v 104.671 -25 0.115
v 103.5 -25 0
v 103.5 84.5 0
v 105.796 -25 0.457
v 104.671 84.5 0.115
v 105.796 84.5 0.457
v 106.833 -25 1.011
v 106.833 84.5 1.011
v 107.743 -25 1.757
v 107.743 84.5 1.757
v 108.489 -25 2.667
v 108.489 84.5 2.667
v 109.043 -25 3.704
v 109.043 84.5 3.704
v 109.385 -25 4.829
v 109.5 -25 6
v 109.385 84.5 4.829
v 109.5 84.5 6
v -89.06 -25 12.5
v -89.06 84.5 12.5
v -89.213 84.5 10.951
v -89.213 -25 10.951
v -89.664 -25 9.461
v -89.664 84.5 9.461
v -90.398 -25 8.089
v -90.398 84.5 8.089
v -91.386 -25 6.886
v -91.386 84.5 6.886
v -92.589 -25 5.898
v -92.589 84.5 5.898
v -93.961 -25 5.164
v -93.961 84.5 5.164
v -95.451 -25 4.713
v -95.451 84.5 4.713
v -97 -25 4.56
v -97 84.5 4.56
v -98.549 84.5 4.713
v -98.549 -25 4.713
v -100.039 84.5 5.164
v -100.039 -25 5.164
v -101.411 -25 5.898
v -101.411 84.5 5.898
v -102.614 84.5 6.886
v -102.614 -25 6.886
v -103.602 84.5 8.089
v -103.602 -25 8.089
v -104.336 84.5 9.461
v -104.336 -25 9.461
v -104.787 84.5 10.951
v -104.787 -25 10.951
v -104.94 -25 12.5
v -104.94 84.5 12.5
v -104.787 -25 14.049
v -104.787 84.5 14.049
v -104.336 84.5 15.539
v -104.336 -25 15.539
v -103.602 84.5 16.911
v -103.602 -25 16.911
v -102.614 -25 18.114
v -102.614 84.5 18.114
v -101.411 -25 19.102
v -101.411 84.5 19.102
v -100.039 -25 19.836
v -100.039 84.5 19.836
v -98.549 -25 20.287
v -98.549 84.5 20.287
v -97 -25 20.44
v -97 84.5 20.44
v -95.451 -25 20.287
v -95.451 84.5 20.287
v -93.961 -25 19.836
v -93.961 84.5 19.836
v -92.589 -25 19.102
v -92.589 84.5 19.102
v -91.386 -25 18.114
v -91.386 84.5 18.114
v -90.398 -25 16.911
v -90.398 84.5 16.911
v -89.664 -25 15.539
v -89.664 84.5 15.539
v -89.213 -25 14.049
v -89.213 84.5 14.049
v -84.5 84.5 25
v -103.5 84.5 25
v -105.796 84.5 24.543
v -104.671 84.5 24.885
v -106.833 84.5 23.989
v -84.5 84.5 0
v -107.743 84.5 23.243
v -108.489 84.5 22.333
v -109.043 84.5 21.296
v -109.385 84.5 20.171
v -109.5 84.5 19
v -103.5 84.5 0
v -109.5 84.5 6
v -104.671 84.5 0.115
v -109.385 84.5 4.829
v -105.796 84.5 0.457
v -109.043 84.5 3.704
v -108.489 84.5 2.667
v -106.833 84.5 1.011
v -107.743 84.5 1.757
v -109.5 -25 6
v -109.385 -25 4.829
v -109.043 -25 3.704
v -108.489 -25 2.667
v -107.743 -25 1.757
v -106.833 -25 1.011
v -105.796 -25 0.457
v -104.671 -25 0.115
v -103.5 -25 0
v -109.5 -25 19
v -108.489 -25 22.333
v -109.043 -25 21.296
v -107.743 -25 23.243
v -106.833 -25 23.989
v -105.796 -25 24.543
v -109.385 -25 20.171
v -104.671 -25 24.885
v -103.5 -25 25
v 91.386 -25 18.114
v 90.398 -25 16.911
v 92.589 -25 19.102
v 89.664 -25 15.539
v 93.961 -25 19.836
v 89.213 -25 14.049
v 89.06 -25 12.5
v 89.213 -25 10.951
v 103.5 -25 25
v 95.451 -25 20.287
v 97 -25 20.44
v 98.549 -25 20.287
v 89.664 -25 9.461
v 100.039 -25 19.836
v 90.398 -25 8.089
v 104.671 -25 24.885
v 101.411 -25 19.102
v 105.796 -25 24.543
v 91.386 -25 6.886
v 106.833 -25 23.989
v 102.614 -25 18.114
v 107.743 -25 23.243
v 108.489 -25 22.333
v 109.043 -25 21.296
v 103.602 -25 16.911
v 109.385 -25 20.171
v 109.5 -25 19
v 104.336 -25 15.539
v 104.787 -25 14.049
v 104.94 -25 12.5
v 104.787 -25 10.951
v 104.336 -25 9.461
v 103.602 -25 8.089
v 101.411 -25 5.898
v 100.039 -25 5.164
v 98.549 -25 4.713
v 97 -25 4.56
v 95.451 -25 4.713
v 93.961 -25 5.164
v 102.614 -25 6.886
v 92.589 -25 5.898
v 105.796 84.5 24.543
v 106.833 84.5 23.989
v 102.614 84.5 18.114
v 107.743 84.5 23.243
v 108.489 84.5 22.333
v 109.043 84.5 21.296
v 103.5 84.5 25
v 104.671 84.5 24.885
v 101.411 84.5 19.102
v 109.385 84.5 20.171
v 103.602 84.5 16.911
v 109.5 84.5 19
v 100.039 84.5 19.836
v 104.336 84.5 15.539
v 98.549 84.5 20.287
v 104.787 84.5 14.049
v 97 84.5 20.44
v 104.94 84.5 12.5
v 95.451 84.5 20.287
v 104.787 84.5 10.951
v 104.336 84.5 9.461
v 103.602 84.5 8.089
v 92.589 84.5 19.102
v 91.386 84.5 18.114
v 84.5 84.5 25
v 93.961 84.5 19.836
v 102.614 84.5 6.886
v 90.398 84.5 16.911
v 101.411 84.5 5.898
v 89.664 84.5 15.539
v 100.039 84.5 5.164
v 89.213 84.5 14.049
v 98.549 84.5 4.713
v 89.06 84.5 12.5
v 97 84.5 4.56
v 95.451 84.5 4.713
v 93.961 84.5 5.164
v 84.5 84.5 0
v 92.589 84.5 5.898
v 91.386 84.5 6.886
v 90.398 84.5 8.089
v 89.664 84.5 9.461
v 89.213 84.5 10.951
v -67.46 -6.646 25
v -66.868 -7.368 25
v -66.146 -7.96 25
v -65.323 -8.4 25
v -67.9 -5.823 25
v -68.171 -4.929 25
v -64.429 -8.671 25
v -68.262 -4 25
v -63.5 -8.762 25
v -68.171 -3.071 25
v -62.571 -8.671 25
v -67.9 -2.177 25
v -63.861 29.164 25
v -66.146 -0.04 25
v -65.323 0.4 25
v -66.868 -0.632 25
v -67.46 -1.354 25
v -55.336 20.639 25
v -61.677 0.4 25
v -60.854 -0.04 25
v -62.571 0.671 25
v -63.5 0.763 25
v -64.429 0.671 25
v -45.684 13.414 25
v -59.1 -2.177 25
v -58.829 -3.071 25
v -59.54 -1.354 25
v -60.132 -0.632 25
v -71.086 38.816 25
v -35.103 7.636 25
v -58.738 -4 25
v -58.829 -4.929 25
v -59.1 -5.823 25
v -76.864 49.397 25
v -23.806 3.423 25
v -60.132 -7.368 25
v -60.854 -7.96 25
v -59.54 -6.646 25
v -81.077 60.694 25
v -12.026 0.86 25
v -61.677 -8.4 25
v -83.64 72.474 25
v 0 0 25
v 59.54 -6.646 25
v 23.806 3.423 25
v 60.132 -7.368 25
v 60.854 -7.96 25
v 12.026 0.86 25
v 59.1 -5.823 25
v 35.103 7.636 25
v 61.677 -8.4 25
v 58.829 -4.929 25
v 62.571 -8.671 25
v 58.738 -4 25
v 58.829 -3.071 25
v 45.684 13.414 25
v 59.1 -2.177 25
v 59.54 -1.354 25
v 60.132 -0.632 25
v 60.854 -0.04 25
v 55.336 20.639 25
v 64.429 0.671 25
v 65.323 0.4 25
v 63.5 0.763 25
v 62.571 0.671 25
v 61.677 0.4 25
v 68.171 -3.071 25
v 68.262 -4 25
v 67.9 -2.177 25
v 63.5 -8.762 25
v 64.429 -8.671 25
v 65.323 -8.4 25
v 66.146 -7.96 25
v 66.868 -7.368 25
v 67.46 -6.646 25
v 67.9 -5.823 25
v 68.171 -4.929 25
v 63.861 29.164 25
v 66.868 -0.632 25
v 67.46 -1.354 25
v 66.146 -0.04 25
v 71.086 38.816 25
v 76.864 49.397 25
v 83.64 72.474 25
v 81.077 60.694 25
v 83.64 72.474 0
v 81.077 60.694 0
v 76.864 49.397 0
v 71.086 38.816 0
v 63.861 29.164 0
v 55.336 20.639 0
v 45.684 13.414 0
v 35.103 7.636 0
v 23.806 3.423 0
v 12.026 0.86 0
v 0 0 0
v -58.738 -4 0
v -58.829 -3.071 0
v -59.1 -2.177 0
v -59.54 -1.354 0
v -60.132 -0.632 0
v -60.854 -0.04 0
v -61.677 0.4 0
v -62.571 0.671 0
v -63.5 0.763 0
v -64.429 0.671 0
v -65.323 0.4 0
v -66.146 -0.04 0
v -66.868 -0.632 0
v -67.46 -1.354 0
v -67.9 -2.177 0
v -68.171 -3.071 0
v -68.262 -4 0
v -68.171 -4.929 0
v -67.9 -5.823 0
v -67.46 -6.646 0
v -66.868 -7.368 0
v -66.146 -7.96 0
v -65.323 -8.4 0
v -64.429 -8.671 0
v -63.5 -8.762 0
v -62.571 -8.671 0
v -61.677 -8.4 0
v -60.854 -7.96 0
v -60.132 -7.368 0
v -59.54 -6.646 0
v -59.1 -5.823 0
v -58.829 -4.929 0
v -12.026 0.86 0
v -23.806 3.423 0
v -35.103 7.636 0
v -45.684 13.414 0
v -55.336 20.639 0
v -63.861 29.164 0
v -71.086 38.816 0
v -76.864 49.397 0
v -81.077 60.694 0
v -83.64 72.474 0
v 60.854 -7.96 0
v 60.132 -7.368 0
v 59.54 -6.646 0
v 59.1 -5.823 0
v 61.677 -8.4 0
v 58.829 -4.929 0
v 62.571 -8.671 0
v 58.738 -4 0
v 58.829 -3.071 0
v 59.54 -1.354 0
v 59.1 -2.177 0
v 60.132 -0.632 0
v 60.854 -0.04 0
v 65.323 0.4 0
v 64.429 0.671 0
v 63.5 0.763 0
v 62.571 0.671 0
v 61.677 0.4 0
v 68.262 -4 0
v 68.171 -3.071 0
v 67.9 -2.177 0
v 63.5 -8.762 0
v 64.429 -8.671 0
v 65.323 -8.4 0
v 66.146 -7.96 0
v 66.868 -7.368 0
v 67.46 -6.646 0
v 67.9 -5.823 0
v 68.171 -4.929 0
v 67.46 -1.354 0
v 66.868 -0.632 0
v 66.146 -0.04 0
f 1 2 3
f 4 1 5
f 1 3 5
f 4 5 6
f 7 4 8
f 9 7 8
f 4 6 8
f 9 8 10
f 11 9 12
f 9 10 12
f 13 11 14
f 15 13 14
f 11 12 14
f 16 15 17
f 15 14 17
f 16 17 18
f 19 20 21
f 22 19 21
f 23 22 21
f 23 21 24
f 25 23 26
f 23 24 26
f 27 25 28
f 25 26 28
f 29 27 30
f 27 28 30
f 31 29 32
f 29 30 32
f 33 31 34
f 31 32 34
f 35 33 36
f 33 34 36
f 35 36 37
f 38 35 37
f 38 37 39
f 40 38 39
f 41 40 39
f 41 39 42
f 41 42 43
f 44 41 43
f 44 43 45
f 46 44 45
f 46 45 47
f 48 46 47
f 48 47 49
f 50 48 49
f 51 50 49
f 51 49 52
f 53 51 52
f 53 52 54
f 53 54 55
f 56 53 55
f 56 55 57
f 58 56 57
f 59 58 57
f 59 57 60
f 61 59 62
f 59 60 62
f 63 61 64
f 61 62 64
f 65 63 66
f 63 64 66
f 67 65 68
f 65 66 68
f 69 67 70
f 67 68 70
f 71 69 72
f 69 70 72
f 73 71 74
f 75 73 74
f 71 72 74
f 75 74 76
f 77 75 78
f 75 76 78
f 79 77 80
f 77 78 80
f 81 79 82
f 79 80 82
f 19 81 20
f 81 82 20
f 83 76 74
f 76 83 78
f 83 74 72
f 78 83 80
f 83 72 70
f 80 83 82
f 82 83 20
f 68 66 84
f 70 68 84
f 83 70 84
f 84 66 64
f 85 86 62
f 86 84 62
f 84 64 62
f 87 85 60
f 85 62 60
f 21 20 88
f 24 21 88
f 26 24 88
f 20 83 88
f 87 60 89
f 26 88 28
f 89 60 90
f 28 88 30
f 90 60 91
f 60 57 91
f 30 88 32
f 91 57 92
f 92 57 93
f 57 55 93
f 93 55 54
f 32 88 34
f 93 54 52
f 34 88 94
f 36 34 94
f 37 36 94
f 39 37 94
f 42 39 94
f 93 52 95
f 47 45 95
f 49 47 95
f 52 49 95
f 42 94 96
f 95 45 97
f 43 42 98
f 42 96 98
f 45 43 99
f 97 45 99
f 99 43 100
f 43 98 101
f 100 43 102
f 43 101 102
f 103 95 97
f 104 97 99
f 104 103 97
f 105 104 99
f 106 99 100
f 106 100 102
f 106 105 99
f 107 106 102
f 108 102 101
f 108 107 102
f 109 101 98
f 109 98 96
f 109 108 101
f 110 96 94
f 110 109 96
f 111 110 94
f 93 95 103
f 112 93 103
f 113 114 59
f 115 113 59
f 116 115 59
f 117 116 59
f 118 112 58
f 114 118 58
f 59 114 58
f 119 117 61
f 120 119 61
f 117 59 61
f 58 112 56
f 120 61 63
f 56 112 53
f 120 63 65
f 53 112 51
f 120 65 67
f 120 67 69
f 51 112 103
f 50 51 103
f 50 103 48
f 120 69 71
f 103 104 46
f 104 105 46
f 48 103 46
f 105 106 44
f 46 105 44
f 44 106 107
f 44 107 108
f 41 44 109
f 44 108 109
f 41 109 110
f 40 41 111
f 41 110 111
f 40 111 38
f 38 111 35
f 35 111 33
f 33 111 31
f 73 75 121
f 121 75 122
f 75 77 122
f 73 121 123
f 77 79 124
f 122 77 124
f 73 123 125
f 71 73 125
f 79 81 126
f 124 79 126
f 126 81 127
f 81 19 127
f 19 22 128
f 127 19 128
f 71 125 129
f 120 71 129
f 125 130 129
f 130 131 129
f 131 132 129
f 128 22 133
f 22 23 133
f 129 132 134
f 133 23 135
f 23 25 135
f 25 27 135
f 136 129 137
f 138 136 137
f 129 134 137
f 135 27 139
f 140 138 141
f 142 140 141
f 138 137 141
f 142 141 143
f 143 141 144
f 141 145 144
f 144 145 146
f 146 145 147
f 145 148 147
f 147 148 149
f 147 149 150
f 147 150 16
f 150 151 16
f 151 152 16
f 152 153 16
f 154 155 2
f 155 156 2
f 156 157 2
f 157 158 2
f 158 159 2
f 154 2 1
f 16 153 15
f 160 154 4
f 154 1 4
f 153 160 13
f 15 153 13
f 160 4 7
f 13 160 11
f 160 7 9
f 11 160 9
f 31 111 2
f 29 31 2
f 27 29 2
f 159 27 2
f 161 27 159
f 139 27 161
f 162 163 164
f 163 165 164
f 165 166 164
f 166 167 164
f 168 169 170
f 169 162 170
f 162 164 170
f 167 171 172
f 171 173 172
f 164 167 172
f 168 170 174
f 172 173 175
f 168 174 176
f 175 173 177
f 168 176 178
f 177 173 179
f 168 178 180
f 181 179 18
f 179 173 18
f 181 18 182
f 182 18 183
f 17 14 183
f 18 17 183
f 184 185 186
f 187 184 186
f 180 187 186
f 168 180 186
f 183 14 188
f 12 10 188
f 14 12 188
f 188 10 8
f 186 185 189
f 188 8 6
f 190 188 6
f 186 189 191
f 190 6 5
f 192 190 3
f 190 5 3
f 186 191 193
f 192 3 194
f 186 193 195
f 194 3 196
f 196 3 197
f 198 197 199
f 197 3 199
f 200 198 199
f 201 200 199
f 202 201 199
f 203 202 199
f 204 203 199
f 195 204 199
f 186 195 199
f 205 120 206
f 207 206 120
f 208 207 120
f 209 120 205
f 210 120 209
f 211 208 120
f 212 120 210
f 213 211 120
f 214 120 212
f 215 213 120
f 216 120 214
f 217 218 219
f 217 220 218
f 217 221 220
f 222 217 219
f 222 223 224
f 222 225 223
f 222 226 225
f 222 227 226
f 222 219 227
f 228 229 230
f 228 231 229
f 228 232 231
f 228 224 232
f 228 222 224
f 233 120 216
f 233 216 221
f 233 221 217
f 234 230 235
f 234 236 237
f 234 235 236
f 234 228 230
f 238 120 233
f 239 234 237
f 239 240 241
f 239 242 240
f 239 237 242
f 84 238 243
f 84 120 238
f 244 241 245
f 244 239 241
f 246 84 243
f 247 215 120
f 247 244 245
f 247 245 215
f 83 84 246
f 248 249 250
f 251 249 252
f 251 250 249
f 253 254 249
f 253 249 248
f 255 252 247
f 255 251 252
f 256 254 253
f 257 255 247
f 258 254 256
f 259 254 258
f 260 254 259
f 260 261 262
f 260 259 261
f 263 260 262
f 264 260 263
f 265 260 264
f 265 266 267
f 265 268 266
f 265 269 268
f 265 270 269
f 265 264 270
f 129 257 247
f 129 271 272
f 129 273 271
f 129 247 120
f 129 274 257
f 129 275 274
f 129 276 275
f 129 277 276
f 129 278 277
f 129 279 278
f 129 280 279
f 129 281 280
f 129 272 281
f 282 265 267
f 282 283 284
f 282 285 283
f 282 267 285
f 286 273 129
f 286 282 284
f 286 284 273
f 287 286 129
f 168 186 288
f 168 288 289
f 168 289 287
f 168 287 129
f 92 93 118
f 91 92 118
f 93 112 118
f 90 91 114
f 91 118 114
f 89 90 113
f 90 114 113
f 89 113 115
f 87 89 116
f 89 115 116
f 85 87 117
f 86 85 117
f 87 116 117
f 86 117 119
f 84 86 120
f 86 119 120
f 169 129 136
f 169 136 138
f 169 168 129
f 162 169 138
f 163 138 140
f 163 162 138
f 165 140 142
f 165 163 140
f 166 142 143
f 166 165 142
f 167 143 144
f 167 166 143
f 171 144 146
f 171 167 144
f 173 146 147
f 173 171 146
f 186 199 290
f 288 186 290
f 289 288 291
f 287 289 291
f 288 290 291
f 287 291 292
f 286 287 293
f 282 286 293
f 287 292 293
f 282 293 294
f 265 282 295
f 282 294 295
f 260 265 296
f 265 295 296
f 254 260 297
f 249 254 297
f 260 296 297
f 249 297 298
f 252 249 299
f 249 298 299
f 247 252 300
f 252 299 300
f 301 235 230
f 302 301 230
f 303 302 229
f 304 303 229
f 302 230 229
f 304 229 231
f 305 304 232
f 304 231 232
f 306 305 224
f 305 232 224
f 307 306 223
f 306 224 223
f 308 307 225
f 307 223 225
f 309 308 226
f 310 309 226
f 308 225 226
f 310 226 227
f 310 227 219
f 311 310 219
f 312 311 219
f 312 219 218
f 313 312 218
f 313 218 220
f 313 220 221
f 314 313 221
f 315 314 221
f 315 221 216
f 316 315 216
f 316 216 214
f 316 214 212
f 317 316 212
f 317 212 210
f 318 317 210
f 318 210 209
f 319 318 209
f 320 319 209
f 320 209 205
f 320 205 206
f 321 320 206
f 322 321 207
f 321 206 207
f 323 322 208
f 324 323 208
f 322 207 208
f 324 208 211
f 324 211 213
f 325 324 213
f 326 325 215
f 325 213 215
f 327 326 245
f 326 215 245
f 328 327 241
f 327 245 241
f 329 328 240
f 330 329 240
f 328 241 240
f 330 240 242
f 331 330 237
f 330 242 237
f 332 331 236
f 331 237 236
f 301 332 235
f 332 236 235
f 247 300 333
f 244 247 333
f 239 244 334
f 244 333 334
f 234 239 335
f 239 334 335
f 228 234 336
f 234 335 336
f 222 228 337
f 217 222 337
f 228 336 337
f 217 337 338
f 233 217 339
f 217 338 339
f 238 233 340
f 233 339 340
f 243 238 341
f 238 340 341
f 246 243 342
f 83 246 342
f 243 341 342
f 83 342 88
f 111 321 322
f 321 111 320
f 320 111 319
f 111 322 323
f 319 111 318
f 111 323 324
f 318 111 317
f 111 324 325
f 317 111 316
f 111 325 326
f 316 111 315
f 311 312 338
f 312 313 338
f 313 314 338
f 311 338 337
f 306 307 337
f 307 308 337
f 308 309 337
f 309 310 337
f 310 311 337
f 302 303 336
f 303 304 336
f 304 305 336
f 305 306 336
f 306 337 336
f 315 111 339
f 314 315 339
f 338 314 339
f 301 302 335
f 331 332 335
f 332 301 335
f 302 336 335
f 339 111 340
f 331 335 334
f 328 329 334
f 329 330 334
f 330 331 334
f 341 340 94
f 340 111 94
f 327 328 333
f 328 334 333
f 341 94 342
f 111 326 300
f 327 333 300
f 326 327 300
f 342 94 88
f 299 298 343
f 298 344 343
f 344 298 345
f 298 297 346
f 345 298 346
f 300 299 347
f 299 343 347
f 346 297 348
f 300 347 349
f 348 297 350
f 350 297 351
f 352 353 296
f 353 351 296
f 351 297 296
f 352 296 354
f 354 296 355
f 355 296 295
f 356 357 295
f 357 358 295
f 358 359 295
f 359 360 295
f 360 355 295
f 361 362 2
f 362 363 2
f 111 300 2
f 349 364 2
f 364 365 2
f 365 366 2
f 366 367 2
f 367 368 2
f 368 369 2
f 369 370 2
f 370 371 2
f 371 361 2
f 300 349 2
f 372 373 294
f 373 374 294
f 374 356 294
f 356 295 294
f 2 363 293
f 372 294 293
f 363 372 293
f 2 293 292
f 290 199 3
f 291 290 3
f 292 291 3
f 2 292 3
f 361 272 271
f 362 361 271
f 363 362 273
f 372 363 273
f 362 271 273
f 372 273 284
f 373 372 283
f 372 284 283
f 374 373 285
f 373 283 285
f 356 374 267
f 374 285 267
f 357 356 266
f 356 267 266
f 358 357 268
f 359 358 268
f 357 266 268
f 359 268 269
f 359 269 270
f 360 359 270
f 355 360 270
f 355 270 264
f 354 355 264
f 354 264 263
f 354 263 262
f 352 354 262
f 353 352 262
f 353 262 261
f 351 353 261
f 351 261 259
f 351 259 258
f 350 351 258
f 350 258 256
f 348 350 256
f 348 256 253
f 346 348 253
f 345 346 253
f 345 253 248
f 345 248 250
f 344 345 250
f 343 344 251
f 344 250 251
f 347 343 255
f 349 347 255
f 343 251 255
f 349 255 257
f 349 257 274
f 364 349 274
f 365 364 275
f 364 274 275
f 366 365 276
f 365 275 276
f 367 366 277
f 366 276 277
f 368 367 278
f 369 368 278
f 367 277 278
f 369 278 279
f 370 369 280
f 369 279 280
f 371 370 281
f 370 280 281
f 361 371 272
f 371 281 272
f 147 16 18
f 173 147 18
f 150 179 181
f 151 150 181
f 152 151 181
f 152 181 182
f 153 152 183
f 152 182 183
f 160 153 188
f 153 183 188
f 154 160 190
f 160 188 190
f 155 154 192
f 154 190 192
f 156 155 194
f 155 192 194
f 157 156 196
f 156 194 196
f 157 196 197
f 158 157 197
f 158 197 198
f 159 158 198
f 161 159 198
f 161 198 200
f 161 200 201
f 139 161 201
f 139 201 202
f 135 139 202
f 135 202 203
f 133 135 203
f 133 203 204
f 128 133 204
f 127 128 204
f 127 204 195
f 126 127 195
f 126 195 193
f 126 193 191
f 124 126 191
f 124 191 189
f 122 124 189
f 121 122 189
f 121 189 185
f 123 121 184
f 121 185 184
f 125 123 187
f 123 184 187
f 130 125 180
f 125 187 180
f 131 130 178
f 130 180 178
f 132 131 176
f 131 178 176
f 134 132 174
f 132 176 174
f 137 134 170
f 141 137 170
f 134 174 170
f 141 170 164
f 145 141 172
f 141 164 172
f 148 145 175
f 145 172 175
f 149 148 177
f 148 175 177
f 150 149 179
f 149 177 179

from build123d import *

# Parameters (mm, degrees)
BOSS_EXTRUDE1_DEPTH = 25
SKETCH5_R           = 7.94
CUT_EXTRUDE1_DEPTH  = 5000
SKETCH6_R           = 4.7625
CUT_EXTRUDE2_DEPTH  = 5000
FILLET2_R           = 6


with BuildPart() as part:
    # Sketch4 → Boss-Extrude1 (new body)
    with BuildSketch(Plane.XY):
        with BuildLine():
            ThreePointArc((0, -25), (-77.42819254, 7.07180746), (-109.5, 84.5))
            Line((-109.5, 84.5), (-109.5, -25))
            Line((-109.5, -25), (0, -25))
        make_face()
        with BuildLine():
            ThreePointArc((84.5, 84.5), (59.75052301, 24.74947699), (0, 0))
            ThreePointArc((0, 0), (-59.75052301, 24.74947699), (-84.5, 84.5))
            Line((-84.5, 84.5), (-109.5, 84.5))
            ThreePointArc((-109.5, 84.5), (-77.42819254, 7.07180746), (0, -25))
            ThreePointArc((0, -25), (77.42819254, 7.07180746), (109.5, 84.5))
            Line((109.5, 84.5), (84.5, 84.5))
        make_face()
        with BuildLine():
            Line((109.5, -25), (109.5, 84.5))
            ThreePointArc((109.5, 84.5), (77.42819254, 7.07180746), (0, -25))
            Line((0, -25), (109.5, -25))
        make_face()
    extrude(amount=BOSS_EXTRUDE1_DEPTH)

    # Sketch5 → Cut-Extrude1 (cut)
    with BuildSketch(Plane(origin=(0, 84.5, 0), x_dir=(1, 0, 0), z_dir=(0, 1, 0))):
        with Locations((-97, -12.5)):
            Circle(SKETCH5_R)
        with Locations((97, -12.5)):
            Circle(SKETCH5_R)
    extrude(amount=-CUT_EXTRUDE1_DEPTH, mode=Mode.SUBTRACT)

    # Sketch6 → Cut-Extrude2 (cut)
    with BuildSketch(Plane.XY.offset(25)):
        with Locations((-63.5, -4)):
            Circle(SKETCH6_R)
        with Locations((63.5, -4)):
            Circle(SKETCH6_R)
    extrude(amount=-CUT_EXTRUDE2_DEPTH, mode=Mode.SUBTRACT)

    # Fillet2
    fillet2_edges = [part.edges().sort_by_distance(p)[0] for p in [
        (109.5, 29.75, 25),
        (-109.5, 29.75, 25),
        (-109.5, 29.75, 0),
        (109.5, 29.75, 0),
    ]]
    fillet(fillet2_edges, radius=FILLET2_R)


solid = part.part
